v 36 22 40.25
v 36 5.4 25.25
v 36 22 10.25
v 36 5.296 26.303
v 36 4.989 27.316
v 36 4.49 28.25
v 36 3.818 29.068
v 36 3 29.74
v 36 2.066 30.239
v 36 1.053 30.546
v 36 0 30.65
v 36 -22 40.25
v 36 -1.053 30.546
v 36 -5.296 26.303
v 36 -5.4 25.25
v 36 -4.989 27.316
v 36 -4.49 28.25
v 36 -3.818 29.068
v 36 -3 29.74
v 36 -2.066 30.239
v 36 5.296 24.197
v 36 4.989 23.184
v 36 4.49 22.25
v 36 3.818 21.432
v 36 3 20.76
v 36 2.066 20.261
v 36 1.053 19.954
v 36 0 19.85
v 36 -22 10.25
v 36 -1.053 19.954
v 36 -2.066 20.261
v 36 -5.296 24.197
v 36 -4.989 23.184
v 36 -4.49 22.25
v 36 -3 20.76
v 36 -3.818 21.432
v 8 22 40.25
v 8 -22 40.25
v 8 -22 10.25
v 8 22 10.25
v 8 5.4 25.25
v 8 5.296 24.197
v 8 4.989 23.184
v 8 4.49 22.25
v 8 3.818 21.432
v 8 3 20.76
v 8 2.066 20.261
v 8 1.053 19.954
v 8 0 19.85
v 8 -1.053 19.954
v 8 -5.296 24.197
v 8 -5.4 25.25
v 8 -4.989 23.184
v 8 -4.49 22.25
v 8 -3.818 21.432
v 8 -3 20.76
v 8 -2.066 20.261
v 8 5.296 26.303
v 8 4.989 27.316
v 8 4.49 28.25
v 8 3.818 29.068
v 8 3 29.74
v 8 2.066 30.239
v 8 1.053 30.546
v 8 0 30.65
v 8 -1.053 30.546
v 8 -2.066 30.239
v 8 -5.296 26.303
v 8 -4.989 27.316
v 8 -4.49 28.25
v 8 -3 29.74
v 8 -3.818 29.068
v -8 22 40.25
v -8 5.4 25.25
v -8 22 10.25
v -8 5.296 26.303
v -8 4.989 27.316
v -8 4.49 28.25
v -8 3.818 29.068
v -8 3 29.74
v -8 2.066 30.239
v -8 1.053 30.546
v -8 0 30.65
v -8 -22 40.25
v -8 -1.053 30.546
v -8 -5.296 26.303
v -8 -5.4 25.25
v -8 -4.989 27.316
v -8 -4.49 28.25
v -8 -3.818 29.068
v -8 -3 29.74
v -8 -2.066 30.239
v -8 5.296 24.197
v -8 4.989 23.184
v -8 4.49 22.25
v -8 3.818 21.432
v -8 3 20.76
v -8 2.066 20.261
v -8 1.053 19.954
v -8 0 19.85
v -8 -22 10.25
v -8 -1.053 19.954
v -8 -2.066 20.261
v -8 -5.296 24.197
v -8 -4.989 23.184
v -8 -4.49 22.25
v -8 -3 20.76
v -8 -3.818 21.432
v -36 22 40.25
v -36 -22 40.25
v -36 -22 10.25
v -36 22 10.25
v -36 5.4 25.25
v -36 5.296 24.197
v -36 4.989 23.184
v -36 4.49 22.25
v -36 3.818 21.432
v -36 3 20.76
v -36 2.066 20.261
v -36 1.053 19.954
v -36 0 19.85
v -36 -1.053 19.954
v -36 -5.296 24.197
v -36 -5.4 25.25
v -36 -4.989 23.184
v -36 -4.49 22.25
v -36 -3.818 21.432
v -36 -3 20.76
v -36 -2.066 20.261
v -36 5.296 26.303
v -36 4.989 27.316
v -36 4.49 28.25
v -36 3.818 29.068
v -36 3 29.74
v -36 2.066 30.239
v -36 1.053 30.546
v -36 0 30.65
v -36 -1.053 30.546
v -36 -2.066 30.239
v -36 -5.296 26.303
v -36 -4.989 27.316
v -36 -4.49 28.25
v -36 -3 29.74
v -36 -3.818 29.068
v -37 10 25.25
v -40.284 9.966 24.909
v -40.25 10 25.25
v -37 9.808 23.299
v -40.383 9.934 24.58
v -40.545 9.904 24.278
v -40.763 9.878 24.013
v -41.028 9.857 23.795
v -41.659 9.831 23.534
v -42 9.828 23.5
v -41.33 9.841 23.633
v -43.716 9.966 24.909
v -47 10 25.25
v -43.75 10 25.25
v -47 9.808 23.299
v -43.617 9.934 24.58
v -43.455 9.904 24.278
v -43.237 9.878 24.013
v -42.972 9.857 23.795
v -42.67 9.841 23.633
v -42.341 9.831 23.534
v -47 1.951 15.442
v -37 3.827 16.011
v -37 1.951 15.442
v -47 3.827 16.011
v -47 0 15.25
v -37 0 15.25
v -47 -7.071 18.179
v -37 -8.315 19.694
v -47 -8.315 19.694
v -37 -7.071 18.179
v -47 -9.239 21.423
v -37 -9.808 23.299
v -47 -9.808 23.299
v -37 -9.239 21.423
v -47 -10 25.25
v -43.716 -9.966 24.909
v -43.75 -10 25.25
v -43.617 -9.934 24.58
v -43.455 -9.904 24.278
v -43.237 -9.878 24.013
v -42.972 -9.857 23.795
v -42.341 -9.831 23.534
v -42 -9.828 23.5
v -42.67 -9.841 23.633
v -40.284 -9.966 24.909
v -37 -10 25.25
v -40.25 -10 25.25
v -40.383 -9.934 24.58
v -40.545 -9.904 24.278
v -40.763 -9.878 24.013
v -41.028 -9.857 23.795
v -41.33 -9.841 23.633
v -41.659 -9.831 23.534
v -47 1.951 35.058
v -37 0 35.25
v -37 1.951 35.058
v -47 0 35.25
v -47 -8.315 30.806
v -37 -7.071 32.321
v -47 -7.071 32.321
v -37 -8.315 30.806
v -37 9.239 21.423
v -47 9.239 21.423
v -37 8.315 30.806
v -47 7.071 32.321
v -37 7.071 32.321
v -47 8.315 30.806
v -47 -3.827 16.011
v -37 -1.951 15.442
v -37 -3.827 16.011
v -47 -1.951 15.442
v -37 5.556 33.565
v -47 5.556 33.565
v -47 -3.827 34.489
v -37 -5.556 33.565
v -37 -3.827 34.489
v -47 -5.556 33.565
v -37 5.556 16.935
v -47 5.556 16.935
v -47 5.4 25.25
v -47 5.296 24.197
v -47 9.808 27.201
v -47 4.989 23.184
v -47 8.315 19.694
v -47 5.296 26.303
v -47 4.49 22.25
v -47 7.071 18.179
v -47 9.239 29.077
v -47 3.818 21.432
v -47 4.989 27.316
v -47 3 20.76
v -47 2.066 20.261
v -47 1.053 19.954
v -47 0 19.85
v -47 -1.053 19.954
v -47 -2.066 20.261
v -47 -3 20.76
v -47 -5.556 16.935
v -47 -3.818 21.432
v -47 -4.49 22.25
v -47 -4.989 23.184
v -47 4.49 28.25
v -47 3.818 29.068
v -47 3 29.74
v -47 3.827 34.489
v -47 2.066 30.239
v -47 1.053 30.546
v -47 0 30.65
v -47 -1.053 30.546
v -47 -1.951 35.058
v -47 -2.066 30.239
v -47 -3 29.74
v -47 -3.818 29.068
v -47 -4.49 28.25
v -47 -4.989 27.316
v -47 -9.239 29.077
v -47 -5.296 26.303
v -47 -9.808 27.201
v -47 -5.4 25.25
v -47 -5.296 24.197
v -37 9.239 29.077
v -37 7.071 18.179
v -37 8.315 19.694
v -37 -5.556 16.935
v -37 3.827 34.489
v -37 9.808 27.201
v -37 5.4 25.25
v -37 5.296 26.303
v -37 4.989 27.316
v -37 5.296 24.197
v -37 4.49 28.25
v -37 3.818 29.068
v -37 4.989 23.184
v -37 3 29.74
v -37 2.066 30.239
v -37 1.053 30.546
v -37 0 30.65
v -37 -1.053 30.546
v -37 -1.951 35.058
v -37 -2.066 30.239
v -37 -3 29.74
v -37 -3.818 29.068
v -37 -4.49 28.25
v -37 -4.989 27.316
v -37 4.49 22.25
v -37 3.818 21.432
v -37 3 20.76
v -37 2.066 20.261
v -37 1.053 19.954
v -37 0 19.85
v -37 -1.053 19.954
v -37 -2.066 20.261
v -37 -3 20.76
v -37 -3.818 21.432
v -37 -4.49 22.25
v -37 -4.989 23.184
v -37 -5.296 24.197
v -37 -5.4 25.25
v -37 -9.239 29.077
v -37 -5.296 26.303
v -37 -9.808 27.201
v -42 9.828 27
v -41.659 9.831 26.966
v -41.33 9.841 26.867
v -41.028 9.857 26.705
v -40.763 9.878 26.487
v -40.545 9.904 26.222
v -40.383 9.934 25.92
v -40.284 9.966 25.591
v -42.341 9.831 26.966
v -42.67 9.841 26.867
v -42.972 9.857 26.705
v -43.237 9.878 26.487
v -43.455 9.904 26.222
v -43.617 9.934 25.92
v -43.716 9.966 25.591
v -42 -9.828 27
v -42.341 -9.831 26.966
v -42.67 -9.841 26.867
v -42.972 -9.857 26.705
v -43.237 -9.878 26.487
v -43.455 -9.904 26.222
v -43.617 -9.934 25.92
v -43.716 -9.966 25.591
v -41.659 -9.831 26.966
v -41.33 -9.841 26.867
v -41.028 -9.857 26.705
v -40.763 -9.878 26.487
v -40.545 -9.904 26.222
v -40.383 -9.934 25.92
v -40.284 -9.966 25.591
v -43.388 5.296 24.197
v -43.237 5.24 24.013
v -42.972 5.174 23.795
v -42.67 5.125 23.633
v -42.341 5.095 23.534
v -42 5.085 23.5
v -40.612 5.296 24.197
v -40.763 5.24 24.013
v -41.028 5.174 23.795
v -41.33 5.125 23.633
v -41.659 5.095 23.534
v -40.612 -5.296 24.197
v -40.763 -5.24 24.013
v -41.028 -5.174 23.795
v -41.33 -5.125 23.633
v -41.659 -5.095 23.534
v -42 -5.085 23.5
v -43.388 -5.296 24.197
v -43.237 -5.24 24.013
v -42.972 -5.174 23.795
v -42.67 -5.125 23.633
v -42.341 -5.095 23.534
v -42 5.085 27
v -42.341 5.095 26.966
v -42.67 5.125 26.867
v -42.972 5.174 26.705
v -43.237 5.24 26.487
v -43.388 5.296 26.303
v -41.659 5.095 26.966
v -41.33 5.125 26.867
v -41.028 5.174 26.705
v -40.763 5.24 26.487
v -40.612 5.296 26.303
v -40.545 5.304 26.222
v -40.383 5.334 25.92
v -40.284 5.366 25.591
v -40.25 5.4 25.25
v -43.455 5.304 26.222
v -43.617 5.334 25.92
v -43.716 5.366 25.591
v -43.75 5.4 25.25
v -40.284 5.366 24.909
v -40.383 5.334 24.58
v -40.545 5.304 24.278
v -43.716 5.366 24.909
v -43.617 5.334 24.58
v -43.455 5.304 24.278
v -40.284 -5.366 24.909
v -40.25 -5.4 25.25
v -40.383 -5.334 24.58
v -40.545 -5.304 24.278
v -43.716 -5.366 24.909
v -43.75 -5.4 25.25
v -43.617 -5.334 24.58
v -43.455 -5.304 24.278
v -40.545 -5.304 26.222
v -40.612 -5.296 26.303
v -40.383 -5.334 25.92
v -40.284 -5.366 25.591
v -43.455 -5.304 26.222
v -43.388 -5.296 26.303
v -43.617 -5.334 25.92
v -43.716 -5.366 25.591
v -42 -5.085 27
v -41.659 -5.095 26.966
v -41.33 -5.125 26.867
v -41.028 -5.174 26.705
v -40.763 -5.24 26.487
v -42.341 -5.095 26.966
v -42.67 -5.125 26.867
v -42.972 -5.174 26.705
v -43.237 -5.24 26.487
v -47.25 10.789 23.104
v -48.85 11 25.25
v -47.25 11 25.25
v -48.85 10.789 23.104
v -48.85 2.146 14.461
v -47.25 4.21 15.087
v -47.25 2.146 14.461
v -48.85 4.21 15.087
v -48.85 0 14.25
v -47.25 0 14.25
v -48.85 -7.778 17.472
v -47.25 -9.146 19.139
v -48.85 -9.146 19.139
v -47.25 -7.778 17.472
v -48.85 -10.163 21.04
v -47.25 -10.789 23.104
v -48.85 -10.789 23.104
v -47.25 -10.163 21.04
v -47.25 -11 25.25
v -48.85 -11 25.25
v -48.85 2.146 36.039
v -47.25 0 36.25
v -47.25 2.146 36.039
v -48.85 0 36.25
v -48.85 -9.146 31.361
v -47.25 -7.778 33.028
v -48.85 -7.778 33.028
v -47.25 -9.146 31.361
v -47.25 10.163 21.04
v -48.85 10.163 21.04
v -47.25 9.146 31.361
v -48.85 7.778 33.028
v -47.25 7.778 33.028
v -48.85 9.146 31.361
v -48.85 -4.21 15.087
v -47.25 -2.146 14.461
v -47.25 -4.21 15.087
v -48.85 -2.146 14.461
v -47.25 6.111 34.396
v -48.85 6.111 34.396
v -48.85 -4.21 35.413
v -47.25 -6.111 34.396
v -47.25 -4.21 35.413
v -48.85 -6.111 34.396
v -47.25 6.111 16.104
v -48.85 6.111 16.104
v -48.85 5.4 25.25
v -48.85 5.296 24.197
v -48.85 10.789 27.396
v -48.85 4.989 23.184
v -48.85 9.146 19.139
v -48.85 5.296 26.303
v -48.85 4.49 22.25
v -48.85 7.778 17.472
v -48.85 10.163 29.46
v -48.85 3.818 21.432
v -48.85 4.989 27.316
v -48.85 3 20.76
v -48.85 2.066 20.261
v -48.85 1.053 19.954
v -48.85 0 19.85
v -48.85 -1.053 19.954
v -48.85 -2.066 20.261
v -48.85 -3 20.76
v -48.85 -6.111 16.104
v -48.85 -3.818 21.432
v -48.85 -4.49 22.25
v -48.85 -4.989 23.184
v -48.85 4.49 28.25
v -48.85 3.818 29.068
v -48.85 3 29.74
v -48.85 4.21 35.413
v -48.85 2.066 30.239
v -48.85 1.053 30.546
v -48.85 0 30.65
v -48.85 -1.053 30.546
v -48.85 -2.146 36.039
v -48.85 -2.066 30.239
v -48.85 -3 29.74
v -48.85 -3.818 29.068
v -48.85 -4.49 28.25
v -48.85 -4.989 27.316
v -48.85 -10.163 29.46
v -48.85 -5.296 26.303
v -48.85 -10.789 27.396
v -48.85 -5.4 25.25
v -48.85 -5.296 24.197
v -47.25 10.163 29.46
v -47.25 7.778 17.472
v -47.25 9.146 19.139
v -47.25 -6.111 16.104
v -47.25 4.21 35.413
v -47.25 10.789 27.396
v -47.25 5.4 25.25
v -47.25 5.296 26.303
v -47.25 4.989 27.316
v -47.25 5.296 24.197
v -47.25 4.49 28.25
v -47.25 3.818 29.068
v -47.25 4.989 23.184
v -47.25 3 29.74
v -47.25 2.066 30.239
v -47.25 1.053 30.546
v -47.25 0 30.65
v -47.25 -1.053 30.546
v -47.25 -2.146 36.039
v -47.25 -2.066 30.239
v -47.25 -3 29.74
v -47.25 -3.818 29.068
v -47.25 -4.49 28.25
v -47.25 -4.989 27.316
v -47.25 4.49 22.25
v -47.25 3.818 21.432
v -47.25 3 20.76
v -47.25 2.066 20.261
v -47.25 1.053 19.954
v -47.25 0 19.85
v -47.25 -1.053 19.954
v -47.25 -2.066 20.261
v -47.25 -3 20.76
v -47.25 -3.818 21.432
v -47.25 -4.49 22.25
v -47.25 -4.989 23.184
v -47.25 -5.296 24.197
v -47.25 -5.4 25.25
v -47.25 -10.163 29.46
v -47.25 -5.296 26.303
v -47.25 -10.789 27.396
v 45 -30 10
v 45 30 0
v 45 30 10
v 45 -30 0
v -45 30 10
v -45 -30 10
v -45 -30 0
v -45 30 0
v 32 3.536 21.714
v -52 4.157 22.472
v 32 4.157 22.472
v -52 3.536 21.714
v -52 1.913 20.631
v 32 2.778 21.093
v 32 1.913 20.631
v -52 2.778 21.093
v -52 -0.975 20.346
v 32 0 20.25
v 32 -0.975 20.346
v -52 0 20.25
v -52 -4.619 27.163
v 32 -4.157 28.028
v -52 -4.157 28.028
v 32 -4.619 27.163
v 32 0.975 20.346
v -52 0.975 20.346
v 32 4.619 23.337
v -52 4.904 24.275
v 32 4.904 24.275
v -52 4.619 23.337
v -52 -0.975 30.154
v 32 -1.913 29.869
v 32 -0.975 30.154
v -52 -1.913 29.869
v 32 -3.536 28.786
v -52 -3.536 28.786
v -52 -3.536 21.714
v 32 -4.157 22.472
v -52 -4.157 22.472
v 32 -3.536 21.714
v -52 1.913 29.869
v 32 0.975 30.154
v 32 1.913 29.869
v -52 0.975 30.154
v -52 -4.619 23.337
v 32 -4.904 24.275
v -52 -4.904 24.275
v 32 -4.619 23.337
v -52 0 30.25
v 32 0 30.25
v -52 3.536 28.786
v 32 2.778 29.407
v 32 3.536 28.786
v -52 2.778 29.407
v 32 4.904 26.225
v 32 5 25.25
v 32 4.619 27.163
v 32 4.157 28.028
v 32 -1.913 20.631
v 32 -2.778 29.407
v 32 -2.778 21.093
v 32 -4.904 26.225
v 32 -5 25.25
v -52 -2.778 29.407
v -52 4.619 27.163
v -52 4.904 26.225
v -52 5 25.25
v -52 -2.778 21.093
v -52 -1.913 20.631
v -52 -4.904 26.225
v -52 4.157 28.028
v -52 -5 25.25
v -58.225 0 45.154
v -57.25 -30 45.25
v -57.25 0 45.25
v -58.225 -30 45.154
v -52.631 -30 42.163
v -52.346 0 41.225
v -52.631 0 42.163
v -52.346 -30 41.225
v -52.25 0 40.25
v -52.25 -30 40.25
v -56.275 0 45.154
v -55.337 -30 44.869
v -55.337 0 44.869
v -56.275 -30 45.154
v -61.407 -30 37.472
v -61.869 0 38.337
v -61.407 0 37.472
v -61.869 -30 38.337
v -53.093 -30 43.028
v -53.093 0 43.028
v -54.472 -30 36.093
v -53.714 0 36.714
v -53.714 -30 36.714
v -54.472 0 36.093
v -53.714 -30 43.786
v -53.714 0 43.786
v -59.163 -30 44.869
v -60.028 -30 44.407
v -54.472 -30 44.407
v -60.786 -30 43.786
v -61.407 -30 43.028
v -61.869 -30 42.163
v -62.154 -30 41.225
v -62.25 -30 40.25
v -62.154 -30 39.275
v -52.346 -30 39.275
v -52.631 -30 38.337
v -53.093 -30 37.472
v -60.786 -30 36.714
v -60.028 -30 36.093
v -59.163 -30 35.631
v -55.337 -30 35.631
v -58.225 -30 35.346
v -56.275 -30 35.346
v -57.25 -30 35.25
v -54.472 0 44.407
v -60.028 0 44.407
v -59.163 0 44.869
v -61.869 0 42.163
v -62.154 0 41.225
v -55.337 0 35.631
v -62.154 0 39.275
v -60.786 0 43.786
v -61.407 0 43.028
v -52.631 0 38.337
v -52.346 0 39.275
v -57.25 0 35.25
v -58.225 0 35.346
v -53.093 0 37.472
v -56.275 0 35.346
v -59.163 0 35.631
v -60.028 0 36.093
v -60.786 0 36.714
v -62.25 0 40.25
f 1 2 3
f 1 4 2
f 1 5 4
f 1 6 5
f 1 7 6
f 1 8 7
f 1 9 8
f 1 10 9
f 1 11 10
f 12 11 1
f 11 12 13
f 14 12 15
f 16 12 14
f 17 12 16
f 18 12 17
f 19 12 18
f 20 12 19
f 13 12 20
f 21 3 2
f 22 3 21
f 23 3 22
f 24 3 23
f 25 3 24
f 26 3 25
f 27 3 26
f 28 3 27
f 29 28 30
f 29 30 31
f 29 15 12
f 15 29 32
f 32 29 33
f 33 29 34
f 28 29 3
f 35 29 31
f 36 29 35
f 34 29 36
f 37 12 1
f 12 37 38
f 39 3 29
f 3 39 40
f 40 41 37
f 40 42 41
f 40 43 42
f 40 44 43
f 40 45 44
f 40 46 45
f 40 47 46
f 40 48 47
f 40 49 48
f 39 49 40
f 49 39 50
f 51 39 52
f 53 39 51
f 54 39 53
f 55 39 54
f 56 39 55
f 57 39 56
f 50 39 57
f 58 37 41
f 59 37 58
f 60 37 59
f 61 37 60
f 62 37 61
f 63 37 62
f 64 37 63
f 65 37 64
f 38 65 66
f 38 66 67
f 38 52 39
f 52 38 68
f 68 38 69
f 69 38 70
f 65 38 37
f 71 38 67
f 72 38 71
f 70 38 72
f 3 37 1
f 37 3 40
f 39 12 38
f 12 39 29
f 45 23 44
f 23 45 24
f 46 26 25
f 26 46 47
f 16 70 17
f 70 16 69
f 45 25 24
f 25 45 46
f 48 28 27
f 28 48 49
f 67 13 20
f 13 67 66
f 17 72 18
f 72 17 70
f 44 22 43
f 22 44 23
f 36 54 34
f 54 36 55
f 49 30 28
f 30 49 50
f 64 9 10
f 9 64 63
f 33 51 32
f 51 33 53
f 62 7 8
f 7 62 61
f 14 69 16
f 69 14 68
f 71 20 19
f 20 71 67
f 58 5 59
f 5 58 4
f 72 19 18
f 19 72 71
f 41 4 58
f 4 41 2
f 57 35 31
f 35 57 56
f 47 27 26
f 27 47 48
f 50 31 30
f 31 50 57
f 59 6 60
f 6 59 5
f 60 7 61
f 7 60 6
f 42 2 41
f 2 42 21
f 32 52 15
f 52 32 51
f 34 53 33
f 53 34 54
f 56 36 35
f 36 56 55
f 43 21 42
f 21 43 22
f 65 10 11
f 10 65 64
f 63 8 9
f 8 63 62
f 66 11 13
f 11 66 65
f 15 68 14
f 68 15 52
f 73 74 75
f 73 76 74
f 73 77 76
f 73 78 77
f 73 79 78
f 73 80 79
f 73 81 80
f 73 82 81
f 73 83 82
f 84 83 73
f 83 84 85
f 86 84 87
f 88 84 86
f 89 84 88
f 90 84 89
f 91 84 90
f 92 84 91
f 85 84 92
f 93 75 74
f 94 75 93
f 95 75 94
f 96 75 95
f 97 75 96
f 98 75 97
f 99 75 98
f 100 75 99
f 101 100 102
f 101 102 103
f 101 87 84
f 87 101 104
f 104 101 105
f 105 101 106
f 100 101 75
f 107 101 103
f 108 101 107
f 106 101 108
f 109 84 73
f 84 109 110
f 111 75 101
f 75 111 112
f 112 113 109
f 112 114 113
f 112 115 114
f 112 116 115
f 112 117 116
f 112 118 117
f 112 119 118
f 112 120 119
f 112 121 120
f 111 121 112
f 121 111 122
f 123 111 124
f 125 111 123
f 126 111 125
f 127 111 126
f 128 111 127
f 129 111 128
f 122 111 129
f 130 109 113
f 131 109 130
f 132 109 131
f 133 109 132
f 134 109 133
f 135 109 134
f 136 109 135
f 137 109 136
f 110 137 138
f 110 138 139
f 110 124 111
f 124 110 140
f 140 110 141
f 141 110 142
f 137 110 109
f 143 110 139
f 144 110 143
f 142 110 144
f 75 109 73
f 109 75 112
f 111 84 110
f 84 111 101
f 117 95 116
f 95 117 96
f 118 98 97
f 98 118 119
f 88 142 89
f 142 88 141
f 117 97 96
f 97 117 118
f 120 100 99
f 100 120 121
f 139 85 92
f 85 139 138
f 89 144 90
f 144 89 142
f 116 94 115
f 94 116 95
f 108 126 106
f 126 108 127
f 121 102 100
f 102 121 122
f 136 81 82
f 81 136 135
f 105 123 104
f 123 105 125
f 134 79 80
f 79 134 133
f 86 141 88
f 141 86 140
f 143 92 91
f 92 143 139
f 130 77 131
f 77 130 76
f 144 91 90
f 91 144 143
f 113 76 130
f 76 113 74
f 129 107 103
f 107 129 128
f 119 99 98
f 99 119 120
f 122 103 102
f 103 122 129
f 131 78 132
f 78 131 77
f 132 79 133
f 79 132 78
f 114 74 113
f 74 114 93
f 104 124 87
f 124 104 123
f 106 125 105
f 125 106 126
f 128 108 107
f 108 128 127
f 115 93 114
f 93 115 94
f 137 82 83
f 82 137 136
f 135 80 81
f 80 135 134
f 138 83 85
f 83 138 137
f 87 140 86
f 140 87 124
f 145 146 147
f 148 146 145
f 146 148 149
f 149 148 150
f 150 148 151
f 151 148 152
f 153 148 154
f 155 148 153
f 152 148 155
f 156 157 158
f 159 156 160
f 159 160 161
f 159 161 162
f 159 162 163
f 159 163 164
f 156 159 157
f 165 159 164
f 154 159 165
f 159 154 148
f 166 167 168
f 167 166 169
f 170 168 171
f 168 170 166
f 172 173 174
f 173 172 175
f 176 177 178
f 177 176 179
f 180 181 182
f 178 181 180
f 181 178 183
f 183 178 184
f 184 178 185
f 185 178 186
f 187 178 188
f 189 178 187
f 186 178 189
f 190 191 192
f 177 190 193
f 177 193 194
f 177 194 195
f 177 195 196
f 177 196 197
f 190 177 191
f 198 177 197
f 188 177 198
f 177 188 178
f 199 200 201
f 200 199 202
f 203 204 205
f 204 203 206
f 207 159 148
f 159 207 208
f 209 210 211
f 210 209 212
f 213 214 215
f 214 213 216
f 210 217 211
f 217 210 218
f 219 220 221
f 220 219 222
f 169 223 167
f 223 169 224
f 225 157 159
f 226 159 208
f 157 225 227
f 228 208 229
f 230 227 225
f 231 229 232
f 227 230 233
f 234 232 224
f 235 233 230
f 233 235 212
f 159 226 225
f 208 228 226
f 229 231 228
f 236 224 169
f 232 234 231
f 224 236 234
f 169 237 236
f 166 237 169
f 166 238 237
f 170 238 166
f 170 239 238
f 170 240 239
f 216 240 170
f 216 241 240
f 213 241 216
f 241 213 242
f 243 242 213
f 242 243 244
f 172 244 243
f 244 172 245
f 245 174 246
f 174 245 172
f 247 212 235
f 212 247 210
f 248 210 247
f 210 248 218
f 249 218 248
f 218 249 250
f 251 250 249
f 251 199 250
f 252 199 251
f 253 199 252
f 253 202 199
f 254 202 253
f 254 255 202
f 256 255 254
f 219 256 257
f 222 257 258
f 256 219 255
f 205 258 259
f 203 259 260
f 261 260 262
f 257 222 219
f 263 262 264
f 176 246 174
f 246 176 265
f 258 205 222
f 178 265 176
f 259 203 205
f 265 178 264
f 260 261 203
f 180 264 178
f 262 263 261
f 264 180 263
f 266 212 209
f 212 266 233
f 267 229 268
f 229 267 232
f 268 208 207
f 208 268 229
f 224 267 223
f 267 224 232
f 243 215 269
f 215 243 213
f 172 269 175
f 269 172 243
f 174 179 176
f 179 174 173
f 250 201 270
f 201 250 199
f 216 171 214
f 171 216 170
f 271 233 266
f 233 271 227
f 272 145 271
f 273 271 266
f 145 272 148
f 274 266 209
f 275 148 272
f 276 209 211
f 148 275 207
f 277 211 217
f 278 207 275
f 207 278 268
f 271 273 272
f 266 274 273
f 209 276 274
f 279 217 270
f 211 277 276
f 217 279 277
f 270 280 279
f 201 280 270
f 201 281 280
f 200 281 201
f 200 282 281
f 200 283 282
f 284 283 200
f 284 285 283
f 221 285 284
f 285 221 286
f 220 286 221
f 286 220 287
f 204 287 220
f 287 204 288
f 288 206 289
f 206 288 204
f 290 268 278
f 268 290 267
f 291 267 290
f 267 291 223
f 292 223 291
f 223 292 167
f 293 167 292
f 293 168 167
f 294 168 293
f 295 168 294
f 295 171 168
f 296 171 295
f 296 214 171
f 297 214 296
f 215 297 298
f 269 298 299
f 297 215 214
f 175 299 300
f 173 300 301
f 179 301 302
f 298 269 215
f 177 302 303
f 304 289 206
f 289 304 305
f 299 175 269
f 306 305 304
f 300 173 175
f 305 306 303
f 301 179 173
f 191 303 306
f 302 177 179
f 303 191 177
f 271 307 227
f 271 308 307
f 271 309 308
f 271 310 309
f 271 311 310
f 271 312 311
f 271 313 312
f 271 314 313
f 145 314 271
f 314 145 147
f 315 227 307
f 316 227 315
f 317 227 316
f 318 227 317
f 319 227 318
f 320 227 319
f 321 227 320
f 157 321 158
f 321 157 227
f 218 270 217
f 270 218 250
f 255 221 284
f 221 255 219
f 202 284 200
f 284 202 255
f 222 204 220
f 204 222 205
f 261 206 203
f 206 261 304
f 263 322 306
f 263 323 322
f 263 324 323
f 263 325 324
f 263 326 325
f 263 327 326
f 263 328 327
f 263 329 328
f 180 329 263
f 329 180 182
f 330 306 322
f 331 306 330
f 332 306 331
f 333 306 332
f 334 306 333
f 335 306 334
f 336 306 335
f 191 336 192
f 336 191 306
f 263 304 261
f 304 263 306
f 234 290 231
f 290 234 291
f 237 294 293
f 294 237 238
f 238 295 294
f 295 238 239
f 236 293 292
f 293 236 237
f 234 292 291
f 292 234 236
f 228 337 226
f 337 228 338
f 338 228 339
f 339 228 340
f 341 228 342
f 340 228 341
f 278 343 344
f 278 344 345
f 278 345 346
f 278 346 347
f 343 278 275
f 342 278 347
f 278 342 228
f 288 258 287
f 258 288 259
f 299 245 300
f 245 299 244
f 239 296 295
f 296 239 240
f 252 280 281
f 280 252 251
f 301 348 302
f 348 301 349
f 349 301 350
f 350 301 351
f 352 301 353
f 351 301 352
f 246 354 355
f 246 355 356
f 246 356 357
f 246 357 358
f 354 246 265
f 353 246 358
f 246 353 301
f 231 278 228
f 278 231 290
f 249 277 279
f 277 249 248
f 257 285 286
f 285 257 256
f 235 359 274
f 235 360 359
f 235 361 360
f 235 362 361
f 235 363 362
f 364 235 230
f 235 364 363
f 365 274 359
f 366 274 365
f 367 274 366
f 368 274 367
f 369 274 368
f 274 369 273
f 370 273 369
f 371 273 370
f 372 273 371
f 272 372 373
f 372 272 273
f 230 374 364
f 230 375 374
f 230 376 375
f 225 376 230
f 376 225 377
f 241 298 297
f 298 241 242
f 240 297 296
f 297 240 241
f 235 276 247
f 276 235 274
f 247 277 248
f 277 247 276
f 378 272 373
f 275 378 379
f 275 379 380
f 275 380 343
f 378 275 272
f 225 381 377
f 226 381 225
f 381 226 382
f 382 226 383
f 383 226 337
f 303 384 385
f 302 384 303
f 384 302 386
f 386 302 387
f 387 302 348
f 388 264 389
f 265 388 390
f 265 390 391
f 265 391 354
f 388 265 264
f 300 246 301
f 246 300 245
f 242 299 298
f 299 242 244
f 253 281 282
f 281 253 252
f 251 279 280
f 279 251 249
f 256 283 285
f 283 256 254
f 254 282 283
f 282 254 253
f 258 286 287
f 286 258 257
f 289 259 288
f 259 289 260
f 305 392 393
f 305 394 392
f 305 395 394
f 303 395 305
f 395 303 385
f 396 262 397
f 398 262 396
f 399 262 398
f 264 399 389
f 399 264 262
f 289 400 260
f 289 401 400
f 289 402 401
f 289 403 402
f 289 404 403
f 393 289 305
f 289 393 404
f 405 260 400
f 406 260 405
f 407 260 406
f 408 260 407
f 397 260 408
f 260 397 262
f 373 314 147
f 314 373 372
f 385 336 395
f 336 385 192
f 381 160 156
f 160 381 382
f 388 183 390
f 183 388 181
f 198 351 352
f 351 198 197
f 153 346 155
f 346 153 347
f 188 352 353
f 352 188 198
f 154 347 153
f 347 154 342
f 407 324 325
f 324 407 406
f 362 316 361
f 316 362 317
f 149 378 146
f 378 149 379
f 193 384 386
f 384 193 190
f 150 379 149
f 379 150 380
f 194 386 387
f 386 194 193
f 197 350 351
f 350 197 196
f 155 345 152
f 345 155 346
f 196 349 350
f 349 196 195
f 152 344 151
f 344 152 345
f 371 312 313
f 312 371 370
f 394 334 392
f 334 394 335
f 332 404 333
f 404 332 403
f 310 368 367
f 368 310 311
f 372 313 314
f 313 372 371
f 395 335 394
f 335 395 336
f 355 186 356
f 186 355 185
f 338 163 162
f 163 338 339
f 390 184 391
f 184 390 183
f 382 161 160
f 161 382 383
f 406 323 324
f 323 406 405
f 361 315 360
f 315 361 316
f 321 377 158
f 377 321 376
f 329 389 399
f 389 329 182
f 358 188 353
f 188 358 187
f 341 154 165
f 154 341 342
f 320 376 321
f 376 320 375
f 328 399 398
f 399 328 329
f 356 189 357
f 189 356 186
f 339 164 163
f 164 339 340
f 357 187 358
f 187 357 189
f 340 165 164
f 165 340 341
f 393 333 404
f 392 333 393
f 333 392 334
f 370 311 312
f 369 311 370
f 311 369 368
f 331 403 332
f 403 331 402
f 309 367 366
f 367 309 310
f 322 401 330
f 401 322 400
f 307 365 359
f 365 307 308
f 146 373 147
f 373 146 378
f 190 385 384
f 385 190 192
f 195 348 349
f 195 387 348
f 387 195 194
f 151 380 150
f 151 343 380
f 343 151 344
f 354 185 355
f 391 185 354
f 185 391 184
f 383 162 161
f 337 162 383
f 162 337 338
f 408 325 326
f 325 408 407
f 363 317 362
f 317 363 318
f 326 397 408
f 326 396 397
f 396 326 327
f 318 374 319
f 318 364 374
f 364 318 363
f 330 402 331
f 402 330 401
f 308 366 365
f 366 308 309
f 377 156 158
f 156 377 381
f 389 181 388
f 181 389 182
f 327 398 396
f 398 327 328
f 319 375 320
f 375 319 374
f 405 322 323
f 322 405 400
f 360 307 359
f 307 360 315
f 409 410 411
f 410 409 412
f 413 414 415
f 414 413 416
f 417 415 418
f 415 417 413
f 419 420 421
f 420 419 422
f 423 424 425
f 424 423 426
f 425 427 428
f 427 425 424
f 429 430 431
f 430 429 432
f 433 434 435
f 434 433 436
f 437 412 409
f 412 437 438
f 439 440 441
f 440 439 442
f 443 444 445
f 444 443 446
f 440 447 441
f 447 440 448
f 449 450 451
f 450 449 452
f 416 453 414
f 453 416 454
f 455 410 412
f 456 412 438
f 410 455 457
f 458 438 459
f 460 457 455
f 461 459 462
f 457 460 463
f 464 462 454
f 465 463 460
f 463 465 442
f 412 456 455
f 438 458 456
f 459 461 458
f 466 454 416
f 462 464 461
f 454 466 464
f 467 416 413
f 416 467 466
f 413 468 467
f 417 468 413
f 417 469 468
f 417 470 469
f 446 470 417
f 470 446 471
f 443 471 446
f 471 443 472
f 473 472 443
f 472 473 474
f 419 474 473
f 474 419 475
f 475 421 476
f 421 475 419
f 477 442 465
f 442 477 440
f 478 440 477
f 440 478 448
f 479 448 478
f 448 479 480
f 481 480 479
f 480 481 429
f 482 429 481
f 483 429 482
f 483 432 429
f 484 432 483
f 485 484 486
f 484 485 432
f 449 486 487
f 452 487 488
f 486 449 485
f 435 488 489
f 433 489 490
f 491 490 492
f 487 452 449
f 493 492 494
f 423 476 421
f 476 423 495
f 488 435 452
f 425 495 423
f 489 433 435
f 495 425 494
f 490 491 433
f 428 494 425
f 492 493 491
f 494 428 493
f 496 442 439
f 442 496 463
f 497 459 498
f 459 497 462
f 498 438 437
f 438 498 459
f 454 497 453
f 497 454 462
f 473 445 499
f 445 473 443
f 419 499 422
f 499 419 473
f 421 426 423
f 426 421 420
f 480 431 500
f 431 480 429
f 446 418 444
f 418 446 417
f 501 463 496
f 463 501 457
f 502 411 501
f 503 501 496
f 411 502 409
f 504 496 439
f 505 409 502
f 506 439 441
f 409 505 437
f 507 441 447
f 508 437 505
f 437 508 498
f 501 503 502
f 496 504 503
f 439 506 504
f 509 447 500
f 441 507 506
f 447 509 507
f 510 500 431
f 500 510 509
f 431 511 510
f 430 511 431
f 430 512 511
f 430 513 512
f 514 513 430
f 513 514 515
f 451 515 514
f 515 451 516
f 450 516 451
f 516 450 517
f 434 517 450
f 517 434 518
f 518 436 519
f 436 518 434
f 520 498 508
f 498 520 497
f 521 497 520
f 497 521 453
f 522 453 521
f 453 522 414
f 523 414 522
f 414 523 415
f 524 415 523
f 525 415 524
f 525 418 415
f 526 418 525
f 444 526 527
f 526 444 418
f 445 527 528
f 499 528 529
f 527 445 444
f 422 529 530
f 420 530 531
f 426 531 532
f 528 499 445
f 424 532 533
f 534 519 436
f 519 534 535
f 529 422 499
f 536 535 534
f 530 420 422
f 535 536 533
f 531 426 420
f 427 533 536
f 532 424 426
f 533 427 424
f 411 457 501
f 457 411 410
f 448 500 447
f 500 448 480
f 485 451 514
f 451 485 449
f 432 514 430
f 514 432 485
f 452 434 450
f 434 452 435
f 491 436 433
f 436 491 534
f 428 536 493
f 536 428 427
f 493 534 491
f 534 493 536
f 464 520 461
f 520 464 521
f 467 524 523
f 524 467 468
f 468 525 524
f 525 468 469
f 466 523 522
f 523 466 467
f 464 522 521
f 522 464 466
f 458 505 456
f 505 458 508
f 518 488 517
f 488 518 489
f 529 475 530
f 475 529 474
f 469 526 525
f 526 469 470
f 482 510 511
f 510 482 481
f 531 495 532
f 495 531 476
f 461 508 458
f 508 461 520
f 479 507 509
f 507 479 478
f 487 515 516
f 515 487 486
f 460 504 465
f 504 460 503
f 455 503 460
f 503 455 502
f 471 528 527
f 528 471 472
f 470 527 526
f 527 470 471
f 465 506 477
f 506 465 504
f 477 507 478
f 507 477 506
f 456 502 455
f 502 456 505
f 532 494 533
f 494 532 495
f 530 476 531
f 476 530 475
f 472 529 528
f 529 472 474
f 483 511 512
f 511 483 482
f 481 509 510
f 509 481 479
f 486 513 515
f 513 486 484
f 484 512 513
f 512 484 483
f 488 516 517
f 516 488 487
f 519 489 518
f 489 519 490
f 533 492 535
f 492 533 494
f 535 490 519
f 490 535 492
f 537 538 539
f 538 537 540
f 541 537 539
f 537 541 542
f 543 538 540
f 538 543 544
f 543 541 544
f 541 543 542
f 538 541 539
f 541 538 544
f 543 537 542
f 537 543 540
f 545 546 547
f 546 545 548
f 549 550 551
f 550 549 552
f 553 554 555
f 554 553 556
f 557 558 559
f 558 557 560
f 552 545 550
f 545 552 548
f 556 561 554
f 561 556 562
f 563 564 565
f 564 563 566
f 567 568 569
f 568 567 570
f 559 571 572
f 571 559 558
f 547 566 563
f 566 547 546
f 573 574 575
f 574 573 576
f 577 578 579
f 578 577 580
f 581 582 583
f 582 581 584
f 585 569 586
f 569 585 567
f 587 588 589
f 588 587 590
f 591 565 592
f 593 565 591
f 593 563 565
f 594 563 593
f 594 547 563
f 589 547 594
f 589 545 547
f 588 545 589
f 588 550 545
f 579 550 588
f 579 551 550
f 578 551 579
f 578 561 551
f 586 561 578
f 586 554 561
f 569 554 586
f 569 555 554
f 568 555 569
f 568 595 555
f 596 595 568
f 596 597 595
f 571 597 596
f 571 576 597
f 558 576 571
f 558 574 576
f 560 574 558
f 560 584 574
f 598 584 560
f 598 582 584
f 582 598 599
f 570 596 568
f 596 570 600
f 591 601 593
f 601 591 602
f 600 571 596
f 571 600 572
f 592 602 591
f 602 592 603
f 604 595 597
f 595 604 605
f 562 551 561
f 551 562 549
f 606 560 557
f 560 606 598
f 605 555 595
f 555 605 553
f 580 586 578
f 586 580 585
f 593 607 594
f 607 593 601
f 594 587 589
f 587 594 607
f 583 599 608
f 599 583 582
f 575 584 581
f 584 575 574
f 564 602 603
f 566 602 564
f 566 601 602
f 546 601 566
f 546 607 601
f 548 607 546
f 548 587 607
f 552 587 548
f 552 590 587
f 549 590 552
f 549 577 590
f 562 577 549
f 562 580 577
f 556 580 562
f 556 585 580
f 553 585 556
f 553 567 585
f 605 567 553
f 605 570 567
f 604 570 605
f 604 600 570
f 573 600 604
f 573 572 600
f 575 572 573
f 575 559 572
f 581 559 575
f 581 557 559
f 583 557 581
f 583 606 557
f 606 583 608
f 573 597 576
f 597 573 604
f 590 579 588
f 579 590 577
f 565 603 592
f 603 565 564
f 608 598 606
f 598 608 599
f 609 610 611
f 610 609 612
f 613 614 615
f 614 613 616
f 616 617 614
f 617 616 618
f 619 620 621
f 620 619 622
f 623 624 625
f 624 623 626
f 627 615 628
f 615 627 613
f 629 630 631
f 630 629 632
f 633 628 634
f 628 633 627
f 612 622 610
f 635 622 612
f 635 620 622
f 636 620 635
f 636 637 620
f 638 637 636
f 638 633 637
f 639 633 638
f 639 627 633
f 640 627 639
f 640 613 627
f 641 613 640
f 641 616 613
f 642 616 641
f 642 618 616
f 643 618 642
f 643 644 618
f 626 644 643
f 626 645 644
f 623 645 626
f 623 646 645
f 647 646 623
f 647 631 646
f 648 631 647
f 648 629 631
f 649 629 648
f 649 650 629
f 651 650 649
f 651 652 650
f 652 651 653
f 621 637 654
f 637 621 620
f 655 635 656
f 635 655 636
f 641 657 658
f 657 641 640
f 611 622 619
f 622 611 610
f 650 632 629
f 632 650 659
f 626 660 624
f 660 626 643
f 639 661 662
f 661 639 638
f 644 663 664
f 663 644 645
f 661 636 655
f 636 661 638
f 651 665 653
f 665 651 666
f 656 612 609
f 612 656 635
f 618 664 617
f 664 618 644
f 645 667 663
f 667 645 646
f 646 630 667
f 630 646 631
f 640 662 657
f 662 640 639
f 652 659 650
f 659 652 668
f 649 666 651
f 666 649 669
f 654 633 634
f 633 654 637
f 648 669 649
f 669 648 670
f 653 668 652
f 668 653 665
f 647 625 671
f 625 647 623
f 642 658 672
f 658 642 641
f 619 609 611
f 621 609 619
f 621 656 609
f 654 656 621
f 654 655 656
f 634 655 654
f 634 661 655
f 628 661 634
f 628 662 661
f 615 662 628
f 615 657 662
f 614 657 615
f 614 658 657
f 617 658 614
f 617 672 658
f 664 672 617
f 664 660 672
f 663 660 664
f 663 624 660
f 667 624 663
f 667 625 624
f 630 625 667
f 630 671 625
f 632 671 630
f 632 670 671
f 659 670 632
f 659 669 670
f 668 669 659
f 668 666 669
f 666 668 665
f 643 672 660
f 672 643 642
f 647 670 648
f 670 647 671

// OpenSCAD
$fn = 32;

// ------------------------------------------------------------------------
// Machine vise: screw d10, jaws 28 x 30 mm
// Every part is its own module, assembly() places every instance.
// ------------------------------------------------------------------------

// --- part 1 ---
module vise_bed() {
  difference() {
    translate([-45, -30, 0]) cube([90, 60, 10]);
  }
}

// --- part 2 ---
module vise_jaw() {
  difference() {
    translate([-14, -22, 0]) cube([28, 44, 30]);
    translate([0, 0, 15]) rotate([0, 90, 0]) cylinder(h = 30, d = 10.8, center = true);
  }
}

// --- part 3 ---
module vise_screw() {
  translate([0, 0, -42]) cylinder(h = 84, d = 10);
}

// --- part 4 ---
module screw_collar() {
  difference() {
    cylinder(h = 10, d = 20);
    translate([0, 0, -1]) cylinder(h = 12, d = 10.8);
    translate([0, 0, 5]) rotate([90, 0, 0]) cylinder(h = 22, d = 3.5, center = true);
  }
}

// --- part 5 ---
module screw_washer() {
  difference() {
      translate([0, 0, 0]) cylinder(h = 1.6, d = 22);
      translate([0, 0, -1]) cylinder(h = 3.6, d = 10.8);
    }
}

// --- part 6 ---
module vise_handle() {
  cylinder(h = 30, d = 10);
}

// --- assembly ---
module assembly() {
  color([0.80, 0.24, 0.20]) translate([0, 0, 0]) rotate([0, 0, 0]) vise_bed();
  color([0.20, 0.45, 0.75]) translate([22, 0, 10.25]) rotate([0, 0, 0]) vise_jaw();
  color([0.25, 0.62, 0.32]) translate([-22, 0, 10.25]) rotate([0, 0, 0]) vise_jaw();
  color([0.92, 0.70, 0.18]) translate([-10, 0, 25.25]) rotate([0, 90, 0]) vise_screw();
  color([0.58, 0.35, 0.70]) translate([-47, 0, 25.25]) rotate([0, 90, 0]) screw_collar();
  color([0.16, 0.66, 0.66]) translate([-48.85, 0, 25.25]) rotate([0, 90, 0]) screw_washer();
  color([0.85, 0.48, 0.18]) translate([-57.25, 0, 40.25]) rotate([90, 0, 0]) vise_handle();
}

assembly();
